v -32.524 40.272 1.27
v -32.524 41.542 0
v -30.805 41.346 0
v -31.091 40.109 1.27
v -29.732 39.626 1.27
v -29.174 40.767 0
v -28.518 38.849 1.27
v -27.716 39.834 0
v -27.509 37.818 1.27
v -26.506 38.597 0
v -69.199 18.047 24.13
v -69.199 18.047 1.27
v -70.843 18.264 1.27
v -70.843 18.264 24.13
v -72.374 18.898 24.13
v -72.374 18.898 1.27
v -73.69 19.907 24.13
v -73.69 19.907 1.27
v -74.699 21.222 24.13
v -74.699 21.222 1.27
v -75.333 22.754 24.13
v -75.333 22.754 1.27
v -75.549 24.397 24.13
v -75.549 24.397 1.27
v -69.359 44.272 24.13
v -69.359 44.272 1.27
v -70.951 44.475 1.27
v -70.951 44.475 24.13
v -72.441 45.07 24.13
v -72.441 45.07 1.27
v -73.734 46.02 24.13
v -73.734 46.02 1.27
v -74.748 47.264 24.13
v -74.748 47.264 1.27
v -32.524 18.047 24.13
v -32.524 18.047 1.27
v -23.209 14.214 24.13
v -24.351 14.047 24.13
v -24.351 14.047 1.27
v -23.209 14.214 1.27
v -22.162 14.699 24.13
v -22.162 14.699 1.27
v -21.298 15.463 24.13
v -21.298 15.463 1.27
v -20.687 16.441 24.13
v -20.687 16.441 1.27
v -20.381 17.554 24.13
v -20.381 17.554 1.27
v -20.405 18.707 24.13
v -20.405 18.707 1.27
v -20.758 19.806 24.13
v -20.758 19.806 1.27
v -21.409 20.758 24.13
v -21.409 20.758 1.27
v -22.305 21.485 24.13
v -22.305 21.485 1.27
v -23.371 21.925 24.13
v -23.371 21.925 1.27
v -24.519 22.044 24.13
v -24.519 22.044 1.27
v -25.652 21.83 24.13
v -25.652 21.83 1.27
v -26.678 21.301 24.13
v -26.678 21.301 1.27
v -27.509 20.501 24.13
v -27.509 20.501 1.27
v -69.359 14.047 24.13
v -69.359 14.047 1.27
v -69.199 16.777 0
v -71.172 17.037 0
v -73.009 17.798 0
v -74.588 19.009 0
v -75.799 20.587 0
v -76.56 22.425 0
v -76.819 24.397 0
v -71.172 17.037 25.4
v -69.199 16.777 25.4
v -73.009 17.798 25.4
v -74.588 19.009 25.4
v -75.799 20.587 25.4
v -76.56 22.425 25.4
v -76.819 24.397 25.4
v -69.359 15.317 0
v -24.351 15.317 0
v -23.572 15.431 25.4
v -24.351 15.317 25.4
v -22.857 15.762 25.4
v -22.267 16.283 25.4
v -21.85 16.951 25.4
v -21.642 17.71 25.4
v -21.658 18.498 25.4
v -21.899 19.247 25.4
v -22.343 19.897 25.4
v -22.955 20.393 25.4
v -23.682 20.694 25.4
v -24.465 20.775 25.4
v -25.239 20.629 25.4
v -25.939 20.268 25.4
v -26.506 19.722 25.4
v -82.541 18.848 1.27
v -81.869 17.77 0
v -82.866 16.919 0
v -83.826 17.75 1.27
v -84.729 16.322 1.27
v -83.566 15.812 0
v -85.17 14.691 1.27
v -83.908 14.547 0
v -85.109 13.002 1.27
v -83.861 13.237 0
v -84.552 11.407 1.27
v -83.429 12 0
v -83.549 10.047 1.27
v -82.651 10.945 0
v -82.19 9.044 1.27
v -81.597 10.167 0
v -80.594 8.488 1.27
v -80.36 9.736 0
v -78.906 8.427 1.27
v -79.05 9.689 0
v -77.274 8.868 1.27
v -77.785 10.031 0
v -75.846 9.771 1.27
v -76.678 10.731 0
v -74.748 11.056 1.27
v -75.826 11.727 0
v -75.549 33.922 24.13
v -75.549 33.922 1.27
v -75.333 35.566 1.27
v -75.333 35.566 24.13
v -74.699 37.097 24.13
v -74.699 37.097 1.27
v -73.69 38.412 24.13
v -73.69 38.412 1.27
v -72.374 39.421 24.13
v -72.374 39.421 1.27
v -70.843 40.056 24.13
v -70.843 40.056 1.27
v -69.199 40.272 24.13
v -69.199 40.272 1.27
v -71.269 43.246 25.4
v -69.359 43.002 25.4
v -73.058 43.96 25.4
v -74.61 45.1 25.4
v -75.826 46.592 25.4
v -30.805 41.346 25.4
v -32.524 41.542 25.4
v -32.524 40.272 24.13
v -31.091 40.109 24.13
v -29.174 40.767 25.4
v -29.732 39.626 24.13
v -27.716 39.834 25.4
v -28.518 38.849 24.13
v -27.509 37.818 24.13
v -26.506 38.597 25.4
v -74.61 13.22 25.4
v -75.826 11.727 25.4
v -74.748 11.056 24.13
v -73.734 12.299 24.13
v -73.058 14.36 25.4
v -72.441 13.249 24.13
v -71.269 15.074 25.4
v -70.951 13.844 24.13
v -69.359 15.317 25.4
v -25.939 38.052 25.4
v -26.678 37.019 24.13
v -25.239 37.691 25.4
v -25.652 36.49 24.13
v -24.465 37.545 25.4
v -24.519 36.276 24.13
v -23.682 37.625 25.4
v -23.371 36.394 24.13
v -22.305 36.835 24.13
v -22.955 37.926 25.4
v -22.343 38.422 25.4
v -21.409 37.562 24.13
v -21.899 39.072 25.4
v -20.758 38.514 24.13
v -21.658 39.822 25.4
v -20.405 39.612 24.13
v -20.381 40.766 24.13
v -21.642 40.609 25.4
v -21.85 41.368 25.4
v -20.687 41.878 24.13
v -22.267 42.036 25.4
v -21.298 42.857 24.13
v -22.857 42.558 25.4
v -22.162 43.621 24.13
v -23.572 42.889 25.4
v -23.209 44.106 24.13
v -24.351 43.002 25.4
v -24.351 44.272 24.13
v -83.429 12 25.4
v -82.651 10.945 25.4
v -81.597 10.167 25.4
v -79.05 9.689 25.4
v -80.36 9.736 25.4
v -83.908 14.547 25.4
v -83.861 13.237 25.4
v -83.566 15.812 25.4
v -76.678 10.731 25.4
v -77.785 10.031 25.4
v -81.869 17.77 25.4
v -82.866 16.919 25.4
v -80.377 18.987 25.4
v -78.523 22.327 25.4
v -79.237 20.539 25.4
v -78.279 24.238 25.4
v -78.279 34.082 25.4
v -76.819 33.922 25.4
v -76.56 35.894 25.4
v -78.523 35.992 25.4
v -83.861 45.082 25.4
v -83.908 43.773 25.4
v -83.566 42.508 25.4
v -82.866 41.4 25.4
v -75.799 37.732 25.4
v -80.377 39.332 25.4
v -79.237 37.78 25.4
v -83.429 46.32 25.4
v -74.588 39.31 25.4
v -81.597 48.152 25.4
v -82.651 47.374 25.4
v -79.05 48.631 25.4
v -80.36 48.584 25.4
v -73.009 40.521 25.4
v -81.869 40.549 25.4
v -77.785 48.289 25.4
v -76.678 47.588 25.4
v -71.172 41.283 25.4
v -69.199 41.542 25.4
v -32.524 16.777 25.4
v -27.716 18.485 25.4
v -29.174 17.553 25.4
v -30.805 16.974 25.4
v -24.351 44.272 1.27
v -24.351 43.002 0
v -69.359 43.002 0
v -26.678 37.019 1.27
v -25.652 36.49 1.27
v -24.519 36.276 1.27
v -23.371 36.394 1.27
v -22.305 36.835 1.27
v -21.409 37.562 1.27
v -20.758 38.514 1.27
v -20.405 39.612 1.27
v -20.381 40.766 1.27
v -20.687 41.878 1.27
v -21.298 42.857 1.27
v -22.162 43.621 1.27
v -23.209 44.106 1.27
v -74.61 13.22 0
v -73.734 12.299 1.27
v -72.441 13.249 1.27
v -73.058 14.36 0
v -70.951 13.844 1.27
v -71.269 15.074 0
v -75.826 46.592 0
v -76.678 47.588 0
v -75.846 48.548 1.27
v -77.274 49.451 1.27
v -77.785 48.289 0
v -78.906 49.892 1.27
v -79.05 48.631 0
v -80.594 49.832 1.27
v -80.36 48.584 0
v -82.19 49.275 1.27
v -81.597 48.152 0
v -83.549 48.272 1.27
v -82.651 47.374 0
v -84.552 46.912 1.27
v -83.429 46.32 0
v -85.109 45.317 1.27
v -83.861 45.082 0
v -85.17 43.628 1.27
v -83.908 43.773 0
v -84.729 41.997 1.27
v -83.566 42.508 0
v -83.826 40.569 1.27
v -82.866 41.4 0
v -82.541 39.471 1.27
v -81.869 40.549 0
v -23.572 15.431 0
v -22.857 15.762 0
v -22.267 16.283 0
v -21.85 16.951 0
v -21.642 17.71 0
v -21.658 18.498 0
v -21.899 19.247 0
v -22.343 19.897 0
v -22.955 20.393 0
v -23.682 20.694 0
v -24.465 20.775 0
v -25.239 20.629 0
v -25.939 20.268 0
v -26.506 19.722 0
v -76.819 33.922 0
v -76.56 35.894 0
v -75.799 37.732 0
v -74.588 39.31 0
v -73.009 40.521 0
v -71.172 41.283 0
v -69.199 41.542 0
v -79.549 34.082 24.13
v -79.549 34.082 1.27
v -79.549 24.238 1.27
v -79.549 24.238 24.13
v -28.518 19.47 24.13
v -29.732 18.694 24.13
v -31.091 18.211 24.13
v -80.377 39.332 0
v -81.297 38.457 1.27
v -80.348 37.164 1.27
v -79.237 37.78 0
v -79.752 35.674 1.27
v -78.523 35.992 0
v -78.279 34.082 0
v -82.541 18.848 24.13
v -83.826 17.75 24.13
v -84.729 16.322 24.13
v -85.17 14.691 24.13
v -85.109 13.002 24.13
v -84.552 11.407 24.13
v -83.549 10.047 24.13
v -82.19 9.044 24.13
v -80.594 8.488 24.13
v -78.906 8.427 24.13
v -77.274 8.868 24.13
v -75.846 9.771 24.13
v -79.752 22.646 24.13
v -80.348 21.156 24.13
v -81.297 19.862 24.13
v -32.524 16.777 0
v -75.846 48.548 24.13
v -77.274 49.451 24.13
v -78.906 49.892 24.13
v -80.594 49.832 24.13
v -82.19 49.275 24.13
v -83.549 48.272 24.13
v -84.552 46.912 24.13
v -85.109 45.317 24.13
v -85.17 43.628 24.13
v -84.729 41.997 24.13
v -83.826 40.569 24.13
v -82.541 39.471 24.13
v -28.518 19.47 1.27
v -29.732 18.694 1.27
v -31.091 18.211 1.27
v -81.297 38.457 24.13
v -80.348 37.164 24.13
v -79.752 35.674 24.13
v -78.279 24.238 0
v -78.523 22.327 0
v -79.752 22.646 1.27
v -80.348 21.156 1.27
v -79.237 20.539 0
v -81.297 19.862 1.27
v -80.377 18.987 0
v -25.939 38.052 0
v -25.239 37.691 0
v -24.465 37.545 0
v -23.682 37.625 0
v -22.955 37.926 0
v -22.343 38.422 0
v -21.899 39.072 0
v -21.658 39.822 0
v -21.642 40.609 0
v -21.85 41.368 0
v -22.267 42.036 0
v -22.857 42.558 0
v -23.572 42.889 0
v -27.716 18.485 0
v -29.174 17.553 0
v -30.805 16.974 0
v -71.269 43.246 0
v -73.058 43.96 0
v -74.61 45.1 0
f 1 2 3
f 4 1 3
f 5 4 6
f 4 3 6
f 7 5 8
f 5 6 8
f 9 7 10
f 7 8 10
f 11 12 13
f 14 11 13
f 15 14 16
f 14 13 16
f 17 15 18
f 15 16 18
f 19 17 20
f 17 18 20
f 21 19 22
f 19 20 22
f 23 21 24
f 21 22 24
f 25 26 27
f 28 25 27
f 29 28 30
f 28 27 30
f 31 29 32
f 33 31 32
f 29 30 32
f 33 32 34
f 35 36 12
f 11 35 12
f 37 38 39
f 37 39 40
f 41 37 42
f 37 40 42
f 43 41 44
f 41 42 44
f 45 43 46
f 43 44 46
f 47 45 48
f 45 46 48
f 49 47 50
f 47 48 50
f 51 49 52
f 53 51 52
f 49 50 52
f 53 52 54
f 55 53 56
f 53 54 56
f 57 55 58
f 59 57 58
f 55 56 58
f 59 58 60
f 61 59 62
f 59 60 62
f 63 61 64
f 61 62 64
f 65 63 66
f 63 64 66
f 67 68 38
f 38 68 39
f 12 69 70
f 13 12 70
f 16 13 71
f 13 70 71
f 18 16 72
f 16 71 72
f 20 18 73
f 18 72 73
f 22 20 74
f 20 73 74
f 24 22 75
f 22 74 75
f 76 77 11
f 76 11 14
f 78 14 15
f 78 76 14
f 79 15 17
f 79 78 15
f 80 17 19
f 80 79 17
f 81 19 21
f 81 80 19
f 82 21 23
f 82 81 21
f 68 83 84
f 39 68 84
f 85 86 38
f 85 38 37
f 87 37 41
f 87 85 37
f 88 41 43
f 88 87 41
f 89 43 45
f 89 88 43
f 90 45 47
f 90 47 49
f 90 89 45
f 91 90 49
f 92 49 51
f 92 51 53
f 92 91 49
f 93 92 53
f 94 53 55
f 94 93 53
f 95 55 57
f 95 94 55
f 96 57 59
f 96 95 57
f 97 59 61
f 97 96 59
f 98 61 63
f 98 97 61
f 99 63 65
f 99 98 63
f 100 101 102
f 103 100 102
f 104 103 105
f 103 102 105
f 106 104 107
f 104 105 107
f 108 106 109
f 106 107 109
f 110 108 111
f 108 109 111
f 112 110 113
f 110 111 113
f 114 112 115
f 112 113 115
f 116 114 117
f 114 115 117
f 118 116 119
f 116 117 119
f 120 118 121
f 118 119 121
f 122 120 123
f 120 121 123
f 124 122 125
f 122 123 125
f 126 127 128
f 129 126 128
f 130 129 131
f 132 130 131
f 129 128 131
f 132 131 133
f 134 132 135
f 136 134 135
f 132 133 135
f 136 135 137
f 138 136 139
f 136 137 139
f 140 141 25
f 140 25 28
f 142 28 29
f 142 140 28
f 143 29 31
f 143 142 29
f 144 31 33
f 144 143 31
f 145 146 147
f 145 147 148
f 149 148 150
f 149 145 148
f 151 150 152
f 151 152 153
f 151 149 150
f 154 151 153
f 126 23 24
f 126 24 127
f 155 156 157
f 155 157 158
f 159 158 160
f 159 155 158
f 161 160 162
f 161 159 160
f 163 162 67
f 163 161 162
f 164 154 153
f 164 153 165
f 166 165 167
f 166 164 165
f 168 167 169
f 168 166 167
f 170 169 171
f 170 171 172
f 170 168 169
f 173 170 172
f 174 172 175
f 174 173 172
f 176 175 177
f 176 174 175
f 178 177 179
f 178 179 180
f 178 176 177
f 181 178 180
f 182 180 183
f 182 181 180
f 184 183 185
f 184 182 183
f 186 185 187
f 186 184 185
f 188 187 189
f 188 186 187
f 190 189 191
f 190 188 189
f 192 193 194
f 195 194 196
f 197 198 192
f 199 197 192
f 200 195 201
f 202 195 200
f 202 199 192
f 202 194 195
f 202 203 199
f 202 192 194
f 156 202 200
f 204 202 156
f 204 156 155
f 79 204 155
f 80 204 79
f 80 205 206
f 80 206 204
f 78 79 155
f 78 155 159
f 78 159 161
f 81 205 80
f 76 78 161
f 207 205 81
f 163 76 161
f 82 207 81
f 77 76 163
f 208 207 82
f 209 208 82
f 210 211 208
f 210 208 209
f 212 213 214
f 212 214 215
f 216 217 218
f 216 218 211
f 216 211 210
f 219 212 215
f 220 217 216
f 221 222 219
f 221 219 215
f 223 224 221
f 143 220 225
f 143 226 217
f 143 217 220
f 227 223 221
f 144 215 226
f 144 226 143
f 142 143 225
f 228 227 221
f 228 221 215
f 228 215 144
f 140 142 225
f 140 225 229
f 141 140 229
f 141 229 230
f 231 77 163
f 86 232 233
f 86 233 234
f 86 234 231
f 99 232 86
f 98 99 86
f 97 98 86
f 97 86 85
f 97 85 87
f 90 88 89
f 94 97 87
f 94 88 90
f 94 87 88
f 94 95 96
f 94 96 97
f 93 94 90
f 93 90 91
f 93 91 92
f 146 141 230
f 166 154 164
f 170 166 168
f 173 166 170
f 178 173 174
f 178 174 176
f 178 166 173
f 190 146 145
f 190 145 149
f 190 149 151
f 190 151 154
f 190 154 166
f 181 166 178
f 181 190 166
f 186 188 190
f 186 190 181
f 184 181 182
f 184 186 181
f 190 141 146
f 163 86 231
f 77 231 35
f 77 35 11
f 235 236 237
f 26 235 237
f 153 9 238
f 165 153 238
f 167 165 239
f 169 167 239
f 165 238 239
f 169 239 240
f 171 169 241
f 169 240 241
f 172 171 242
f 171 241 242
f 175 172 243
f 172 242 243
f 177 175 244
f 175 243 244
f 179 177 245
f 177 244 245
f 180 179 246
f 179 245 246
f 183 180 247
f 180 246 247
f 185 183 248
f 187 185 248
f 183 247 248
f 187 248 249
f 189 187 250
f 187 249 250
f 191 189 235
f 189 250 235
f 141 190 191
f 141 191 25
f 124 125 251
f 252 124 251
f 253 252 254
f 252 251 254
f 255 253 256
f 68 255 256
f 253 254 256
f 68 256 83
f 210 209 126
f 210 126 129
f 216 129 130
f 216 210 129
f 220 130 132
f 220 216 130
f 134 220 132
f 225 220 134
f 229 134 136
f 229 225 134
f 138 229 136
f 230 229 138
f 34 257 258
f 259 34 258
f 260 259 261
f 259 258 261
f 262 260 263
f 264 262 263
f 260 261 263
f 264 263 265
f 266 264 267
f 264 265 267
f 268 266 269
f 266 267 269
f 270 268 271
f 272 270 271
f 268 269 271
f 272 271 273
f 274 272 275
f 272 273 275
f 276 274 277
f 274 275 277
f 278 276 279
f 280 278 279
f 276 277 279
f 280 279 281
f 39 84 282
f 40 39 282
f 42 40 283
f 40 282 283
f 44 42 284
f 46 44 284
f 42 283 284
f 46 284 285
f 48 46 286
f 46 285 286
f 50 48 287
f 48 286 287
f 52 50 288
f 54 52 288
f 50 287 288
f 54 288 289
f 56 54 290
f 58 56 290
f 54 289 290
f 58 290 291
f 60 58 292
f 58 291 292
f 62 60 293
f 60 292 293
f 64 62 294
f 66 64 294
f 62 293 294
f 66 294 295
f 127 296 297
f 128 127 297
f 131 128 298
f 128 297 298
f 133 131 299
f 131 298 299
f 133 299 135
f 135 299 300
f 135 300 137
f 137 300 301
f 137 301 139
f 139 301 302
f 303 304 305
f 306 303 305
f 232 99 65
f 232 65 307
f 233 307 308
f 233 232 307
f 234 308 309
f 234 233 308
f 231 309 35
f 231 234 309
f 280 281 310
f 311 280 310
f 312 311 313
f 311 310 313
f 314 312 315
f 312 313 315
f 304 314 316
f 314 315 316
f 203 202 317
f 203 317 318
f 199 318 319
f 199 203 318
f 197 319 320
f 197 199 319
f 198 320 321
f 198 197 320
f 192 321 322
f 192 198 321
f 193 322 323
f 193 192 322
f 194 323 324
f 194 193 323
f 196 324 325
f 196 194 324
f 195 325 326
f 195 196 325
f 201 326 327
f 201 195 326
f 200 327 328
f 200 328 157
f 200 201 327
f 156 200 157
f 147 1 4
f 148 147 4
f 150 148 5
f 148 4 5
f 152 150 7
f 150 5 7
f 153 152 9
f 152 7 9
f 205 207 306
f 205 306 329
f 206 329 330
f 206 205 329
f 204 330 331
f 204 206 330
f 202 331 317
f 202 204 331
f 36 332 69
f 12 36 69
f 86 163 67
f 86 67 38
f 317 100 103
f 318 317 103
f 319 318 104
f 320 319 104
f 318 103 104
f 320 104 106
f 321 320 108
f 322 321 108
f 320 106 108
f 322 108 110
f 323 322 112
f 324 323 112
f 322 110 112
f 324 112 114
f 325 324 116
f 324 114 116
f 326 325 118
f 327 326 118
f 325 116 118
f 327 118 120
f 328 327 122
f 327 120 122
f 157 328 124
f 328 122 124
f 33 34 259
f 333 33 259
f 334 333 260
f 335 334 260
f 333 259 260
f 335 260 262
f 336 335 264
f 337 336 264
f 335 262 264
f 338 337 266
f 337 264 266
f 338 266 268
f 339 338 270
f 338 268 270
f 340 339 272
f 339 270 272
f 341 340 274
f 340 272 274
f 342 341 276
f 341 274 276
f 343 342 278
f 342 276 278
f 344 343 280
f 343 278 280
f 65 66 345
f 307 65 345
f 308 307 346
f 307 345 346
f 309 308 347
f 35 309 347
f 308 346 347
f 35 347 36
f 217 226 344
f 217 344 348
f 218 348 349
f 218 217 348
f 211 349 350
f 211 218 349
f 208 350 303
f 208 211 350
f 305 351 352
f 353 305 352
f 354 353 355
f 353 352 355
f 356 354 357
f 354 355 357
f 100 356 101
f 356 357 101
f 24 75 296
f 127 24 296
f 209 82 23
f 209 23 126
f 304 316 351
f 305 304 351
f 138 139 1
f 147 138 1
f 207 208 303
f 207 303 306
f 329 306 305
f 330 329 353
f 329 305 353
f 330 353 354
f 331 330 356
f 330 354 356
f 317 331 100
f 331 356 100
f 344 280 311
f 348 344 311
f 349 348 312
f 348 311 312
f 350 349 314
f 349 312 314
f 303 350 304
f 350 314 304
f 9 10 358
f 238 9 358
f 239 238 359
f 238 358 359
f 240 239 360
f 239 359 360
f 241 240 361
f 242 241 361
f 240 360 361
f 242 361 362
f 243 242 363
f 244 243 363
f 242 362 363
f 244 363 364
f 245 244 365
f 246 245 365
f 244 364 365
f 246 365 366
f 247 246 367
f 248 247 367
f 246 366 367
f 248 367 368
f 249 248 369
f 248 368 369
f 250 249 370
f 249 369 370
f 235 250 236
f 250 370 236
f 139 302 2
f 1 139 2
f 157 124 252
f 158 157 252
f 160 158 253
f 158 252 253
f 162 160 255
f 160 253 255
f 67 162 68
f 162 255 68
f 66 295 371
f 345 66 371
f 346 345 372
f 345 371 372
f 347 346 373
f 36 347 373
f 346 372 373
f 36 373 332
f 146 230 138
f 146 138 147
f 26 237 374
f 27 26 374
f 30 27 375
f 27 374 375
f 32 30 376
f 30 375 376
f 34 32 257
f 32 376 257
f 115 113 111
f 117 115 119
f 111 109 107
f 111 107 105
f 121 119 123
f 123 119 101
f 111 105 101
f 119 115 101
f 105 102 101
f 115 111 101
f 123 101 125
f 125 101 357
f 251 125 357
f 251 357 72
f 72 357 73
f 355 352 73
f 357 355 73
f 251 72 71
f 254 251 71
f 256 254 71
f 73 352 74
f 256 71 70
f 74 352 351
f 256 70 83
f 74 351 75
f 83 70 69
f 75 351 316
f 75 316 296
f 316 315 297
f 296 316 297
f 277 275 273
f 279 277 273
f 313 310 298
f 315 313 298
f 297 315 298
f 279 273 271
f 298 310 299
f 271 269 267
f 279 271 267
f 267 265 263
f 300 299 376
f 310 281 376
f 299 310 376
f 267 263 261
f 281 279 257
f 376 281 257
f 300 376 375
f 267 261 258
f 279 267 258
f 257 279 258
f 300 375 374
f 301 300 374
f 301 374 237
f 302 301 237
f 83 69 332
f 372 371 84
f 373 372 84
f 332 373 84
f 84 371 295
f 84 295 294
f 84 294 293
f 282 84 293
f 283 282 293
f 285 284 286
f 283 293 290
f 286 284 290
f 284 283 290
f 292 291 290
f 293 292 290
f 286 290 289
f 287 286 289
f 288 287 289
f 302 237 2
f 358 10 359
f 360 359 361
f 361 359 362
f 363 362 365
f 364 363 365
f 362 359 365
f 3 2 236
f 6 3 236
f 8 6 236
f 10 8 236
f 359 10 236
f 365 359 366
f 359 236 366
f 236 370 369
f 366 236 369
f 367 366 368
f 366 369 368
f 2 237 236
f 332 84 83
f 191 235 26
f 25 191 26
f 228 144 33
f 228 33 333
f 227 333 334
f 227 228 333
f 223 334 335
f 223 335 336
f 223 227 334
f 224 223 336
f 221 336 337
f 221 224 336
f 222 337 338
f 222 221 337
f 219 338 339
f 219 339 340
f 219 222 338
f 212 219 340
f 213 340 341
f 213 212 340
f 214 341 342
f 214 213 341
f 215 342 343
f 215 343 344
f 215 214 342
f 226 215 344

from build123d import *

# Parameters (mm, degrees)
F1_DEPTH = 25.4
F2_SIZE  = 1.27


with BuildPart() as f1:
    # F0 (on Top) → F1 (new body)
    with BuildSketch(Plane.XY):
        with BuildLine():
            ThreePointArc((-69.19944, 18.047227), (-73.689569, 19.907098), (-75.54944, 24.397227))
            Line((-75.54944, 24.397227), (-75.54944, 33.922227))
            ThreePointArc((-75.54944, 33.922227), (-73.689569, 38.412355), (-69.19944, 40.272227))
            Line((-69.19944, 40.272227), (-32.523775, 40.272227))
            ThreePointArc((-32.523775, 40.272227), (-29.732398, 39.625797), (-27.509345, 37.81812))
            ThreePointArc((-27.509345, 37.81812), (-20.757849, 38.513879), (-24.350649, 44.272227))
            Line((-24.350649, 44.272227), (-69.359149, 44.272227))
            ThreePointArc((-69.359149, 44.272227), (-72.441141, 45.070306), (-74.748433, 47.263936))
            ThreePointArc((-74.748433, 47.263936), (-83.54944, 48.272227), (-82.54115, 39.471219))
            ThreePointArc((-82.54115, 39.471219), (-80.34752, 37.163927), (-79.54944, 34.081935))
            Line((-79.54944, 34.081935), (-79.54944, 24.237518))
            ThreePointArc((-79.54944, 24.237518), (-80.34752, 21.155526), (-82.54115, 18.848234))
            ThreePointArc((-82.54115, 18.848234), (-83.54944, 10.047227), (-74.748433, 11.055517))
            ThreePointArc((-74.748433, 11.055517), (-72.441141, 13.249147), (-69.359149, 14.047227))
            Line((-69.359149, 14.047227), (-24.350649, 14.047227))
            ThreePointArc((-24.350649, 14.047227), (-20.757849, 19.805574), (-27.509345, 20.501333))
            ThreePointArc((-27.509345, 20.501333), (-29.732398, 18.693656), (-32.523775, 18.047227))
            Line((-32.523775, 18.047227), (-69.19944, 18.047227))
        make_face()
    extrude(amount=F1_DEPTH)

    # F2
    f2_edges = [f1.edges().sort_by_distance(p)[0] for p in [
        (-79.54944, 29.159727, 25.4),
        (-80.34752, 21.155526, 25.4),
        (-50.861608, 40.272227, 25.4),
        (-46.854899, 44.272227, 25.4),
        (-50.861608, 18.047227, 25.4),
        (-83.54944, 10.047227, 25.4),
        (-83.54944, 48.272227, 0),
        (-83.54944, 10.047227, 0),
        (-79.54944, 29.159727, 0),
        (-82.54115, 39.471219, 12.7),
        (-80.34752, 21.155526, 0),
        (-24.350649, 44.272227, 12.7),
        (-29.732398, 18.693656, 25.4),
        (-20.757849, 19.805574, 25.4),
        (-83.54944, 48.272227, 25.4),
        (-79.54944, 24.237518, 12.7),
        (-79.54944, 34.081935, 12.7),
        (-75.54944, 29.159727, 25.4),
        (-82.54115, 18.848234, 12.7),
        (-73.689569, 38.412355, 25.4),
        (-46.854899, 14.047227, 25.4),
        (-32.523775, 18.047227, 12.7),
        (-80.34752, 37.163927, 25.4),
        (-72.441141, 45.070306, 25.4),
        (-73.689569, 19.907098, 25.4),
        (-72.441141, 45.070306, 0),
        (-46.854899, 44.272227, 0),
        (-72.441141, 13.249147, 25.4),
        (-29.732398, 18.693656, 0),
        (-20.757849, 19.805574, 0),
        (-20.757849, 38.513879, 0),
        (-75.54944, 29.159727, 0),
        (-73.689569, 38.412355, 0),
        (-27.509345, 37.81812, 12.7),
        (-69.19944, 18.047227, 12.7),
        (-24.350649, 14.047227, 12.7),
        (-69.359149, 14.047227, 12.7),
        (-75.54944, 24.397227, 12.7),
        (-75.54944, 33.922227, 12.7),
        (-74.748433, 47.263936, 12.7),
        (-69.359149, 44.272227, 12.7),
        (-80.34752, 37.163927, 0),
        (-32.523775, 40.272227, 12.7),
        (-69.19944, 40.272227, 12.7),
        (-73.689569, 19.907098, 0),
        (-50.861608, 18.047227, 0),
        (-29.732398, 39.625797, 25.4),
        (-20.757849, 38.513879, 25.4),
        (-74.748433, 11.055517, 12.7),
        (-27.509345, 20.501333, 12.7),
        (-29.732398, 39.625797, 0),
        (-46.854899, 14.047227, 0),
        (-72.441141, 13.249147, 0),
        (-50.861608, 40.272227, 0),
    ]]
    chamfer(f2_edges, length=F2_SIZE)


solid = f1.part
